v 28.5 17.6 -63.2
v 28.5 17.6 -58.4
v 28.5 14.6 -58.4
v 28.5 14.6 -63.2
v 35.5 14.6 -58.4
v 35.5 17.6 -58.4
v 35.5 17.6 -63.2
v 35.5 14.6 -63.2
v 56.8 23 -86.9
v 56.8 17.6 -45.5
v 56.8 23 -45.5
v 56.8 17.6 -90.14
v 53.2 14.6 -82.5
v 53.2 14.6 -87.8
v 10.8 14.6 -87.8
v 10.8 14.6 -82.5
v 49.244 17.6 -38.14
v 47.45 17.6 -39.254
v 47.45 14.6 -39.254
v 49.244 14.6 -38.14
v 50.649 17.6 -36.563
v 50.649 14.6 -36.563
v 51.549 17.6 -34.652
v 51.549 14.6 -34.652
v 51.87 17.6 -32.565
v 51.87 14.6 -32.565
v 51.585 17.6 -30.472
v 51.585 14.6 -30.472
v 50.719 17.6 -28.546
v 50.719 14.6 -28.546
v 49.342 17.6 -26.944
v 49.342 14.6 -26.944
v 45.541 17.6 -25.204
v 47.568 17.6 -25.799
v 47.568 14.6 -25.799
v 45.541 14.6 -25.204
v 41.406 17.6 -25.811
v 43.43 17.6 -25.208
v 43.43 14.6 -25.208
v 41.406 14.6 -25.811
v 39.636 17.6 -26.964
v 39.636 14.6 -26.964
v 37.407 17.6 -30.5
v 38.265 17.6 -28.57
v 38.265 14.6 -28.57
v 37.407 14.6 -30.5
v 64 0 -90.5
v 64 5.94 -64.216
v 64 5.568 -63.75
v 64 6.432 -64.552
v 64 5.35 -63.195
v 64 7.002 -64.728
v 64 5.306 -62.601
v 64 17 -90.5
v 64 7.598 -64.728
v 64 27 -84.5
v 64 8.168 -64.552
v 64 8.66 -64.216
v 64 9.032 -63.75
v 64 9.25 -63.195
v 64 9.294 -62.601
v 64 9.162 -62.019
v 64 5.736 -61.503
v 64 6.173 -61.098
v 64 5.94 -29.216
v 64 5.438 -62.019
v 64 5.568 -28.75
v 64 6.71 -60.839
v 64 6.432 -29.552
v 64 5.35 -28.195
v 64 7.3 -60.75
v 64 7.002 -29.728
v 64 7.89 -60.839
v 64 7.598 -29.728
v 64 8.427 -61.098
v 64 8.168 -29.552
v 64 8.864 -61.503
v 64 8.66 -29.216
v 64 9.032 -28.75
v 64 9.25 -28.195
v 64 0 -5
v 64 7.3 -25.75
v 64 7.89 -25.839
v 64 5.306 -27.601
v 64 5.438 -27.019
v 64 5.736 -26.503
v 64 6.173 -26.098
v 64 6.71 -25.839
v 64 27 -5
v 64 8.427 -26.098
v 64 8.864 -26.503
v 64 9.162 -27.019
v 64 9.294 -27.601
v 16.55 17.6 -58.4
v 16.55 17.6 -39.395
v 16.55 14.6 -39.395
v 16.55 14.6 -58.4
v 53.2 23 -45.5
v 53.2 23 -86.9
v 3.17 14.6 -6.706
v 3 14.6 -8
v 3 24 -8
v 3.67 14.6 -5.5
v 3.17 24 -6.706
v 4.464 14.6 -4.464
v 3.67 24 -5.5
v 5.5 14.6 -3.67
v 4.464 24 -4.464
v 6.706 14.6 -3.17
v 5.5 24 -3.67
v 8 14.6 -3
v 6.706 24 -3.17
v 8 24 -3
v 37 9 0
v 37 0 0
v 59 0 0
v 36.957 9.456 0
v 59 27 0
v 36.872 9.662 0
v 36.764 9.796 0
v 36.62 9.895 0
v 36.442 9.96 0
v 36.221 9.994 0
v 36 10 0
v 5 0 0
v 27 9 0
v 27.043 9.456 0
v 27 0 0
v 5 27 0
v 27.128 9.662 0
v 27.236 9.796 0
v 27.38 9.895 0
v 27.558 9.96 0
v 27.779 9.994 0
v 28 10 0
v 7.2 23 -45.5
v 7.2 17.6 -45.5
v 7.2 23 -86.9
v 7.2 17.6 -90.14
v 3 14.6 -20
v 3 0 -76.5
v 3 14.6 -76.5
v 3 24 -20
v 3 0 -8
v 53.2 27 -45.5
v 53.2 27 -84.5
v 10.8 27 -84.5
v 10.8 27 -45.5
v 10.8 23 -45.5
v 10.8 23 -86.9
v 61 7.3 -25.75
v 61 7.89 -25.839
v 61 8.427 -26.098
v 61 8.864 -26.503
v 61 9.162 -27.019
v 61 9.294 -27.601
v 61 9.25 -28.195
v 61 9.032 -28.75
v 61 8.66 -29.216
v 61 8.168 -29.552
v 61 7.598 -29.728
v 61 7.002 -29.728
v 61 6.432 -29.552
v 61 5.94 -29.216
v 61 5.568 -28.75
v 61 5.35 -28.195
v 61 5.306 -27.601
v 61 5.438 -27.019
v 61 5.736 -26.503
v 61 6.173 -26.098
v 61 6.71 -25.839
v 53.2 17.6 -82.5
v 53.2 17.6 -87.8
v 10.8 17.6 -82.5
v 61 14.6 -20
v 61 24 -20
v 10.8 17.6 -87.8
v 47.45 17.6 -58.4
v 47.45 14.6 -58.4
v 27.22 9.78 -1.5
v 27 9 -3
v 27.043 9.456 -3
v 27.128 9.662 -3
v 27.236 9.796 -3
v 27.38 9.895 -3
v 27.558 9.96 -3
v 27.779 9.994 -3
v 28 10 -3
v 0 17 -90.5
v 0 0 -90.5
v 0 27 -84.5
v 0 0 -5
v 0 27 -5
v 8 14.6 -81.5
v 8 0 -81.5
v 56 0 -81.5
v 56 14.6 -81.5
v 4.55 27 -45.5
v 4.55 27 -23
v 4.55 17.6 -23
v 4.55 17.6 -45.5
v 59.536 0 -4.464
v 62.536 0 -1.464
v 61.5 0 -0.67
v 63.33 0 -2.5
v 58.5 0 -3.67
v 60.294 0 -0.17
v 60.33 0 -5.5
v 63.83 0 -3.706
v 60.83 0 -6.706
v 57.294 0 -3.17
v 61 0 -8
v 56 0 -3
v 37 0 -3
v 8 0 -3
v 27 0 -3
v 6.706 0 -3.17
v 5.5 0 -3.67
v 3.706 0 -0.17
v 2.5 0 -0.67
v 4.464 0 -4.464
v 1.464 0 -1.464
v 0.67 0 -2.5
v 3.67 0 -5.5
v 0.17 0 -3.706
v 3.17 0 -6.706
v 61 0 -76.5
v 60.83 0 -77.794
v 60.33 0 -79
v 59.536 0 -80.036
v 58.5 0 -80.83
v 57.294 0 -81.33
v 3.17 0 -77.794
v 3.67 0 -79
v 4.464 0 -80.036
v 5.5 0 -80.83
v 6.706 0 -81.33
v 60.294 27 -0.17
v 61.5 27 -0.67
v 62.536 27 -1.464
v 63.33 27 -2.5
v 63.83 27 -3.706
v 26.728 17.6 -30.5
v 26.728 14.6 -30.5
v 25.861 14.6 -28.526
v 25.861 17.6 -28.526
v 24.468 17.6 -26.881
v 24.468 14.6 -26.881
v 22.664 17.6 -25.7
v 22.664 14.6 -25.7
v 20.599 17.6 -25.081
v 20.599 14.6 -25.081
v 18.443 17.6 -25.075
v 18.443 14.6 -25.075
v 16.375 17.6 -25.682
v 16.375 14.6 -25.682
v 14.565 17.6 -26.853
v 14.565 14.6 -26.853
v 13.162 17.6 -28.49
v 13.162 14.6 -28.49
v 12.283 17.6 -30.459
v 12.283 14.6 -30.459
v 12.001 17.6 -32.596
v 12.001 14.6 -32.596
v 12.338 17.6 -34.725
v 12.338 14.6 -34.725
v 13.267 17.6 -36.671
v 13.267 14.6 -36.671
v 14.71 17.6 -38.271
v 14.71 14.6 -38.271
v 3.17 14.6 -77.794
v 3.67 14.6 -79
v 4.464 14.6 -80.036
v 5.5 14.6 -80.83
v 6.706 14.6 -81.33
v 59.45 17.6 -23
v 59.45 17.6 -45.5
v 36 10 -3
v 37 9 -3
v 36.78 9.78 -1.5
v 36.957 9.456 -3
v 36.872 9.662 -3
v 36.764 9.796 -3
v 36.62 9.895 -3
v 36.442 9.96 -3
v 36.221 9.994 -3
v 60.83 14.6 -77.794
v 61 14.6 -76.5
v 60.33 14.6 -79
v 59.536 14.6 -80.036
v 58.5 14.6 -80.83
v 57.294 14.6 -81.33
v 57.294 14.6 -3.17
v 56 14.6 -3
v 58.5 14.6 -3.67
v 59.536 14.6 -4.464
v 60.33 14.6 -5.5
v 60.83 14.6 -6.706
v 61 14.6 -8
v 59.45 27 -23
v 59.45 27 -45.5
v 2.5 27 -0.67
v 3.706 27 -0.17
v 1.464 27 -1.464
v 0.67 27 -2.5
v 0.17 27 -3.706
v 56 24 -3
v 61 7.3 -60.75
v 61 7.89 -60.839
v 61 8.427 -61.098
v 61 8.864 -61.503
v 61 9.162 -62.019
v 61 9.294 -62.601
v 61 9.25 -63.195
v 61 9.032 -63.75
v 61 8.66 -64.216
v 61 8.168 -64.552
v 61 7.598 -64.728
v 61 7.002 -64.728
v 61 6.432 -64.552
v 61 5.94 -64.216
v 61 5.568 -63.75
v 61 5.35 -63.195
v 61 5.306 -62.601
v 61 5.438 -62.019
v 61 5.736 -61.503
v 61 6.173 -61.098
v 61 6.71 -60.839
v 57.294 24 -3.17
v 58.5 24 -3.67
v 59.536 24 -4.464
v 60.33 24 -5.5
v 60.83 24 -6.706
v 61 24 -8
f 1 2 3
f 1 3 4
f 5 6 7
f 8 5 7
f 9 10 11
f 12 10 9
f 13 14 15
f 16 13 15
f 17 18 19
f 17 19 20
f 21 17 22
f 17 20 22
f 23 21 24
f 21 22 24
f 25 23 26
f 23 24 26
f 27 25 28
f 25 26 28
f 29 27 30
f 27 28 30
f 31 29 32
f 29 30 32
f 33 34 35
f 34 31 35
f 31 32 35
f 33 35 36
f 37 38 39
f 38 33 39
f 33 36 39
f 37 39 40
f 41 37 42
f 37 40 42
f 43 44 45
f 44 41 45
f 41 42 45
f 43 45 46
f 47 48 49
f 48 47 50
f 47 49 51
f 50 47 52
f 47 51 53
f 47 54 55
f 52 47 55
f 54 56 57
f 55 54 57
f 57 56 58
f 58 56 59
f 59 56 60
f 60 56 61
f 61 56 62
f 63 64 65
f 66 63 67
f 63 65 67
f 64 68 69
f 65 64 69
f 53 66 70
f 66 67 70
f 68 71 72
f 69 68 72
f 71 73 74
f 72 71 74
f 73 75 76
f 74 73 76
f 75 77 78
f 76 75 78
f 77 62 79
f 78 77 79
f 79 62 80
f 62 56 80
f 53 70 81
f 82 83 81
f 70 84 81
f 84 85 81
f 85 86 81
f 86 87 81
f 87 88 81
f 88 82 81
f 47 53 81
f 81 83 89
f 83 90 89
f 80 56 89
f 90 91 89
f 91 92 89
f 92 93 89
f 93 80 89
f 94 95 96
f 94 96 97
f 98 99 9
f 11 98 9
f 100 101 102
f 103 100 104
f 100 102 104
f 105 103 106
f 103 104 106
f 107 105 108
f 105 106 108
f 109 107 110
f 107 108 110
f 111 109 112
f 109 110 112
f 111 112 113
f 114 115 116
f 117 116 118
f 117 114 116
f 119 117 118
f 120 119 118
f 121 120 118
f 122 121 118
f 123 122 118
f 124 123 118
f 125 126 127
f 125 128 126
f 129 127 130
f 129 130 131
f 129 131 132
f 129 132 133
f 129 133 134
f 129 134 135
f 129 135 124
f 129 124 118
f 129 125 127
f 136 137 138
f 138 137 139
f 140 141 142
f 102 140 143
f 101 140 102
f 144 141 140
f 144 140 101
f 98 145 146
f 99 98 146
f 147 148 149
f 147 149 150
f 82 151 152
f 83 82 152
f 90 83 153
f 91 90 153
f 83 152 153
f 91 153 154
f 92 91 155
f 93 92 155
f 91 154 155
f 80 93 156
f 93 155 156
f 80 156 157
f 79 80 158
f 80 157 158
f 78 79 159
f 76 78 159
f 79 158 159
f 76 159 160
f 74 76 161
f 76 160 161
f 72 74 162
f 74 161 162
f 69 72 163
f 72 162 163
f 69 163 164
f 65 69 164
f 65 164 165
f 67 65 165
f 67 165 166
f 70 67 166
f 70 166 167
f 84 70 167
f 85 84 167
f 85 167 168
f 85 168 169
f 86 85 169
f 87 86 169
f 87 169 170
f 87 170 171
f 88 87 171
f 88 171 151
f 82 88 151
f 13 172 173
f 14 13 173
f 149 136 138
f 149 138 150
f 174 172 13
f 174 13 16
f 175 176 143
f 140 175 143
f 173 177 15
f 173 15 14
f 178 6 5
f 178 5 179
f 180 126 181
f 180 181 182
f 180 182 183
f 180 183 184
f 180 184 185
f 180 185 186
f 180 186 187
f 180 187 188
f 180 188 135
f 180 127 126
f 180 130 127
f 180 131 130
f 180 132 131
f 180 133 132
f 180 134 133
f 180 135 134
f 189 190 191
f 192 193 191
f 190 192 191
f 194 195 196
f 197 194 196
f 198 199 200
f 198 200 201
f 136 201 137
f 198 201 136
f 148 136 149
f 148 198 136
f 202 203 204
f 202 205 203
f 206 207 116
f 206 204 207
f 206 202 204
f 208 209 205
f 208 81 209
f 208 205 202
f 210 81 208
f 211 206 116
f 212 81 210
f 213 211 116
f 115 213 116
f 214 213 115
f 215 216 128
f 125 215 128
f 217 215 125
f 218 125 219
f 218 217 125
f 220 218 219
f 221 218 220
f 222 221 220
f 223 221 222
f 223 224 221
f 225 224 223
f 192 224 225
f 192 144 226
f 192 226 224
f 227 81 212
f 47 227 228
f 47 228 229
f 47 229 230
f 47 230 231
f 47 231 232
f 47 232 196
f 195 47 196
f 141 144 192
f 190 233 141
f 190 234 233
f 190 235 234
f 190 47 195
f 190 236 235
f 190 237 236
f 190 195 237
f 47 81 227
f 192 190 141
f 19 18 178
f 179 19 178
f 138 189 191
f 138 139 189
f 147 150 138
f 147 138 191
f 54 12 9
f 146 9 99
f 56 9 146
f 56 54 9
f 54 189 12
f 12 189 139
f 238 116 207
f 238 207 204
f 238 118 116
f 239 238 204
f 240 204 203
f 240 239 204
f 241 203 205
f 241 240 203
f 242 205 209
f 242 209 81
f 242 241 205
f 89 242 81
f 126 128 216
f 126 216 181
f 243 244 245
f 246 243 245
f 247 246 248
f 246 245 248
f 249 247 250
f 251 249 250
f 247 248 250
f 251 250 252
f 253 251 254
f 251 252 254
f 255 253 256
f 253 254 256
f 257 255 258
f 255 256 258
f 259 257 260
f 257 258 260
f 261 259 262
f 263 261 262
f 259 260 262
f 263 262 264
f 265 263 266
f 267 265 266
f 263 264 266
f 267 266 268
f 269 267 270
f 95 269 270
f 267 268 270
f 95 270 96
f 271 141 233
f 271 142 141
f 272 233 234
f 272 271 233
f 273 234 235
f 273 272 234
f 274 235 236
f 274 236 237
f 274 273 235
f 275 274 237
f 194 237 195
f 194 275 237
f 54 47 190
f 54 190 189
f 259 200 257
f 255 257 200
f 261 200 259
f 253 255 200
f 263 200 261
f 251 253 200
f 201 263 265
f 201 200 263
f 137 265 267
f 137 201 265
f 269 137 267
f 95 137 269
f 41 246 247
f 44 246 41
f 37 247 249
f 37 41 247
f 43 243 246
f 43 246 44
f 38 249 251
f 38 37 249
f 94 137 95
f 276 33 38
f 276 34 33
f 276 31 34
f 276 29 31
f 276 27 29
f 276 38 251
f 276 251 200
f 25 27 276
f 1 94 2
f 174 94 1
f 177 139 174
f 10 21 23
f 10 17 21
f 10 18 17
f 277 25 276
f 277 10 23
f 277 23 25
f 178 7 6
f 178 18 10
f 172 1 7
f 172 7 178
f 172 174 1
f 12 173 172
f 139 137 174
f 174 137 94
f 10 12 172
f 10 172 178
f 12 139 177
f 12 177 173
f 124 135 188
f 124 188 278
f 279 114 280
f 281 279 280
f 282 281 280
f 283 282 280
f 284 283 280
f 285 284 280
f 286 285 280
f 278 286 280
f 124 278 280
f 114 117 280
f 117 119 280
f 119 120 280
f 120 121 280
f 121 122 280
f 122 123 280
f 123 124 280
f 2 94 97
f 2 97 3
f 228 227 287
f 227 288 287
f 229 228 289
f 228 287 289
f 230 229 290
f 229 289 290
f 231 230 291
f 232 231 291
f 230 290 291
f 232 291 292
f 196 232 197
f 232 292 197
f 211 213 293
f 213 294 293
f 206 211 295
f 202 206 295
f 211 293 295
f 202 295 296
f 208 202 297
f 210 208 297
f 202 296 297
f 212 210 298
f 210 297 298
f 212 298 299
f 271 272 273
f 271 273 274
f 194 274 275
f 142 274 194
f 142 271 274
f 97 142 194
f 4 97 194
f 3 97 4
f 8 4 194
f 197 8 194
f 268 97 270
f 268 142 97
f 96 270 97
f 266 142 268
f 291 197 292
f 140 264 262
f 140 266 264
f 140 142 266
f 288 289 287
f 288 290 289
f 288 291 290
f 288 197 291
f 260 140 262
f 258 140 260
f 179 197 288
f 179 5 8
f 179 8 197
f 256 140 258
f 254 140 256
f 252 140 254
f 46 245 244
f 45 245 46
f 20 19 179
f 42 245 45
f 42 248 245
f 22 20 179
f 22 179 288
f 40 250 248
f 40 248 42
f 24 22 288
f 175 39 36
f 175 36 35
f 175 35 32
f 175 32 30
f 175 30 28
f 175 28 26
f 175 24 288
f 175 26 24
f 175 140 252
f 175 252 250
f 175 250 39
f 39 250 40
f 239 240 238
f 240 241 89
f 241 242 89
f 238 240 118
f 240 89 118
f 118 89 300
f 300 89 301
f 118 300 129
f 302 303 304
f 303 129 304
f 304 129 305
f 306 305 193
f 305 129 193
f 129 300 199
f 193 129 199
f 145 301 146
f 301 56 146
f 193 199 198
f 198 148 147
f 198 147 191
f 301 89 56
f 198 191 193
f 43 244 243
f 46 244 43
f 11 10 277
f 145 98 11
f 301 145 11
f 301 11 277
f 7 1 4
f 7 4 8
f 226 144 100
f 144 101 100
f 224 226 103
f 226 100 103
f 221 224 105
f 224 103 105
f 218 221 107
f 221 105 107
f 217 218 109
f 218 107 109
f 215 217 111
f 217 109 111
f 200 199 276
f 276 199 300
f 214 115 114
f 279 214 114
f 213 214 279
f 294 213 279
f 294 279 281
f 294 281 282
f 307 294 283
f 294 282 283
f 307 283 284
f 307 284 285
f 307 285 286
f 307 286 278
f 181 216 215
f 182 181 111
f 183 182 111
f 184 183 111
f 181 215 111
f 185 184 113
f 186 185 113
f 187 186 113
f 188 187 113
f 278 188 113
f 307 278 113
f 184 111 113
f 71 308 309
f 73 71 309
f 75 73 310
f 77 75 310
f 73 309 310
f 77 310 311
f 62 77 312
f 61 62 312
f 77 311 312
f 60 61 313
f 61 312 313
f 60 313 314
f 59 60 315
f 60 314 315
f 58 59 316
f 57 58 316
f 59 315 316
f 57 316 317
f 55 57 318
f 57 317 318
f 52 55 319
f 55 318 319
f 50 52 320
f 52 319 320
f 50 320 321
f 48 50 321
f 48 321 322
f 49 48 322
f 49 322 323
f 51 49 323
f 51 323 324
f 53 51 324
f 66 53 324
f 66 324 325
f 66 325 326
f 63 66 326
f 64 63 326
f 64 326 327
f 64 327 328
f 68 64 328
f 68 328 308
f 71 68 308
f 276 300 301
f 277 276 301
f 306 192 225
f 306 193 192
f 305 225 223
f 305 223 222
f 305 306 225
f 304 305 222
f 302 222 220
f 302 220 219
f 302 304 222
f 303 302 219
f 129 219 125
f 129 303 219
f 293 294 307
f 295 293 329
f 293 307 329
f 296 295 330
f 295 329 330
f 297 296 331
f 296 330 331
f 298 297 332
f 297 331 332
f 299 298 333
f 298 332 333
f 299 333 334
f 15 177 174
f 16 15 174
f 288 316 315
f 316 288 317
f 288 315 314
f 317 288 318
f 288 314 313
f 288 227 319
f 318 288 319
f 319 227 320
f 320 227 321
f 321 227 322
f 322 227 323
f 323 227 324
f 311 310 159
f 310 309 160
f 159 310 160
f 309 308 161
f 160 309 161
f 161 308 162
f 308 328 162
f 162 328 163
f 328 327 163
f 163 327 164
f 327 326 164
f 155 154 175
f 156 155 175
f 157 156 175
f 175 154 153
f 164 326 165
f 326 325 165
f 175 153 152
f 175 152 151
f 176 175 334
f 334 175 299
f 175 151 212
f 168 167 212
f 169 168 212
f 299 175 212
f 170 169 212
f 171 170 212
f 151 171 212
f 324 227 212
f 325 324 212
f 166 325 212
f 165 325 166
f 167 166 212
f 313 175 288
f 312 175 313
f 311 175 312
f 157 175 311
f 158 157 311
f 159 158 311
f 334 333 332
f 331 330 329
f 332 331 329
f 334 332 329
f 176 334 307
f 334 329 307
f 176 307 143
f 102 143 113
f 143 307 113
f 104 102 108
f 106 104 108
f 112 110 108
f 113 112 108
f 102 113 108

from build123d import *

# Parameters (mm, degrees)
SKETCH1_W           = 64
SKETCH1_H           = 84.5
BOSS_EXTRUDE1_DEPTH = 27
FILLET1_R           = 5
SKETCH2_W           = 42.4
SKETCH2_H           = 61.5
CUT_EXTRUDE1_DEPTH  = 9.4
SKETCH3_W           = 3.6
SKETCH3_H           = 5.4
CUT_EXTRUDE2_DEPTH  = 61.5
SKETCH4_W           = 7
SKETCH4_H           = 4.8
CUT_EXTRUDE3_DEPTH  = 61.5
SKETCH5_W           = 58
SKETCH5_H           = 78.5
CUT_EXTRUDE4_DEPTH  = 14.6
FILLET2_R           = 5
CUT_EXTRUDE5_START  = -9.4
CUT_EXTRUDE5_DEPTH  = 9.4
SKETCH7_W           = 10
SKETCH7_H           = 10
CUT_EXTRUDE6_DEPTH  = 10
FILLET3_SIZE        = 1
SKETCH8_W           = 6.25
SKETCH8_H           = 13.5
CUT_EXTRUDE8_DEPTH  = 9.4
CUT_EXTRUDE9_DEPTH  = 10
SKETCH10_W          = 6.25
SKETCH10_H          = 9
CUT_EXTRUDE10_DEPTH = 9.4
SKETCH11_W          = 7
SKETCH11_H          = 1
SKETCH11_W_2        = 29.4
CUT_EXTRUDE11_DEPTH = 9.4
SKETCH12_W          = 29.4
SKETCH12_H          = 7.5
BOSS_EXTRUDE2_DEPTH = 3
SKETCH13_W          = 0.75
SKETCH13_H          = 27.9
CUT_EXTRUDE12_DEPTH = 3
SKETCH15_R          = 7.369867451
SKETCH15_R_2        = 7.5
CUT_EXTRUDE13_DEPTH = 3
BOSS_EXTRUDE3_DEPTH = 64
BOSS_EXTRUDE4_DEPTH = 27
SKETCH18_W          = 49.6
SKETCH18_H          = 7.565133063
CUT_EXTRUDE16_DEPTH = 5.4
SKETCH19_W          = 42.4
SKETCH19_H          = 4
CUT_EXTRUDE17_DEPTH = 5.4
CUT_EXTRUDE18_DEPTH = 3
SKETCH21_R          = 2
CUT_EXTRUDE19_DEPTH = 10


with BuildPart() as part:
    # Sketch1 → Boss-Extrude1 (new body)
    with BuildSketch(Plane(origin=(0, 0, 0), x_dir=(1, 0, 0), z_dir=(0, 1, 0))):
        with Locations((32, 42.25)):
            Rectangle(SKETCH1_W, SKETCH1_H)
    extrude(amount=BOSS_EXTRUDE1_DEPTH)

    # Fillet1
    fillet1_edges = [part.edges().sort_by_distance(p)[0] for p in [
        (0, 13.5, -84.5),
        (64, 13.5, -84.5),
        (64, 13.5, 0),
        (0, 13.5, 0),
    ]]
    fillet(fillet1_edges, radius=FILLET1_R)

    # Sketch2 → Cut-Extrude1 (cut)
    with BuildSketch(Plane(origin=(0, 27, 0), x_dir=(1, 0, 0), z_dir=(0, 1, 0))):
        with Locations((32, 53.75)):
            Rectangle(SKETCH2_W, SKETCH2_H)
    extrude(amount=-CUT_EXTRUDE1_DEPTH, mode=Mode.SUBTRACT)

    # Sketch3 → Cut-Extrude2 (cut)
    with BuildSketch(Plane(origin=(0, 0, -84.5), x_dir=(-1, 0, 0), z_dir=(0, 0, -1))):
        with Locations((-55, 20.3)):
            Rectangle(SKETCH3_W, SKETCH3_H)
        with Locations((-9, 20.3)):
            Rectangle(SKETCH3_W, SKETCH3_H)
    extrude(amount=-CUT_EXTRUDE2_DEPTH, mode=Mode.SUBTRACT)

    # Sketch4 → Cut-Extrude3 (cut)
    with BuildSketch(Plane(origin=(0, 17.6, 0), x_dir=(1, 0, 0), z_dir=(0, 1, 0))):
        Polygon((17.3, 23), (46.7, 23), (46.7, 49.4), (35.5, 49.4), (28.5, 49.4), (17.3, 49.4), align=None)
        with Locations((32, 51.8)):
            Rectangle(SKETCH4_W, SKETCH4_H)
    extrude(amount=-CUT_EXTRUDE3_DEPTH, mode=Mode.SUBTRACT)

    # Sketch5 → Cut-Extrude4 (cut)
    with BuildSketch(Plane.XZ):
        with Locations((32, -42.25)):
            Rectangle(SKETCH5_W, SKETCH5_H)
        Polygon((28.5, -54.2), (28.5, -49.4), (17.3, -49.4), (17.3, -23), (46.7, -23), (46.7, -49.4), (35.5, -49.4), (35.5, -54.2), align=None, mode=Mode.SUBTRACT)
    extrude(amount=-CUT_EXTRUDE4_DEPTH, mode=Mode.SUBTRACT)

    # Fillet2
    fillet2_edges = [part.edges().sort_by_distance(p)[0] for p in [
        (61, 7.3, -3),
        (61, 7.3, -81.5),
        (3, 7.3, -81.5),
        (3, 7.3, -3),
    ]]
    fillet(fillet2_edges, radius=FILLET2_R)

    # Sketch6 → Cut-Extrude5 (cut)
    with BuildSketch(Plane.XZ.offset(-14.6).offset(CUT_EXTRUDE5_START)):
        with BuildLine():
            Line((8, -3), (56, -3))
            ThreePointArc((56, -3), (59.535533906, -4.464466094), (61, -8))
            Line((61, -8), (61, -20))
            Line((61, -20), (56, -20))
            Line((56, -20), (8, -20))
            Line((8, -20), (3, -20))
            Line((3, -20), (3, -8))
            ThreePointArc((3, -8), (4.464466094, -4.464466094), (8, -3))
        make_face()
    extrude(amount=CUT_EXTRUDE5_DEPTH, mode=Mode.SUBTRACT)

    # Sketch7 → Cut-Extrude6 (cut)
    with BuildSketch(Plane.XY):
        with Locations((32, 5)):
            Rectangle(SKETCH7_W, SKETCH7_H)
    extrude(amount=-CUT_EXTRUDE6_DEPTH, mode=Mode.SUBTRACT)

    # Fillet3
    # a fillet whose section is not a circle: 1 mm, written as the material it adds along each edge
    with BuildSketch(Plane(origin=(37, 10, 0), x_dir=(0, -1, 0), z_dir=(0, 0, -1))) as fillet3_piece_1:
        with BuildLine():
            add(Edge.make_bspline([(FILLET3_SIZE, 0), (FILLET3_SIZE * 0.831801948466, 0), (FILLET3_SIZE * 0.663603896932, 0), (FILLET3_SIZE * 0.292893218813, FILLET3_SIZE * 0.0716919198361), (FILLET3_SIZE * 0.0716919198361, FILLET3_SIZE * 0.292893218813), (0, FILLET3_SIZE * 0.663603896932), (0, FILLET3_SIZE * 0.831801948466), (0, FILLET3_SIZE)], knots=[0, 0, 0, 0, 0, 0, 0.5, 0.5, 1, 1, 1, 1, 1, 1], degree=5))
            Line((0, FILLET3_SIZE), (0, 0))
            Line((0, 0), (FILLET3_SIZE, 0))
        make_face()
    extrude(amount=3)
    with BuildSketch(Plane(origin=(27, 10, 0), x_dir=(0, -1, 0), z_dir=(0, 0, -1))) as fillet3_piece_2:
        with BuildLine():
            add(Edge.make_bspline([(FILLET3_SIZE, 0), (FILLET3_SIZE * 0.831801948466, 0), (FILLET3_SIZE * 0.663603896932, 0), (FILLET3_SIZE * 0.292893218813, -FILLET3_SIZE * 0.0716919198361), (FILLET3_SIZE * 0.0716919198361, -FILLET3_SIZE * 0.292893218813), (0, -FILLET3_SIZE * 0.663603896932), (0, -FILLET3_SIZE * 0.831801948466), (0, -FILLET3_SIZE)], knots=[0, 0, 0, 0, 0, 0, 0.5, 0.5, 1, 1, 1, 1, 1, 1], degree=5))
            Line((0, -FILLET3_SIZE), (0, 0))
            Line((0, 0), (FILLET3_SIZE, 0))
        make_face()
    extrude(amount=3)

    # Sketch8 → Cut-Extrude8 (cut)
    with BuildSketch(Plane(origin=(0, 27, 0), x_dir=(1, 0, 0), z_dir=(0, 1, 0))):
        with Locations((7.675, 29.75)):
            Rectangle(SKETCH8_W, SKETCH8_H)
        with Locations((56.325, 29.75)):
            Rectangle(SKETCH8_W, SKETCH8_H)
    extrude(amount=-CUT_EXTRUDE8_DEPTH, mode=Mode.SUBTRACT)

    # Sketch9 → Cut-Extrude9 (cut)
    with BuildSketch(Plane(origin=(0, 17.6, 0), x_dir=(1, 0, 0), z_dir=(0, 1, 0))):
        Polygon((17.3, 49.4), (17.3, 57.4), (28.5, 57.4), (28.5, 62.2), (35.5, 62.2), (35.5, 57.4), (46.7, 57.4), (46.7, 49.4), align=None)
    extrude(amount=-CUT_EXTRUDE9_DEPTH, mode=Mode.SUBTRACT)

    # Sketch10 → Cut-Extrude10 (cut)
    with BuildSketch(Plane(origin=(0, 27, 0), x_dir=(1, 0, 0), z_dir=(0, 1, 0))):
        with Locations((7.675, 41)):
            Rectangle(SKETCH10_W, SKETCH10_H)
        with Locations((56.325, 41)):
            Rectangle(SKETCH10_W, SKETCH10_H)
    extrude(amount=-CUT_EXTRUDE10_DEPTH, mode=Mode.SUBTRACT)

    # Sketch11 → Cut-Extrude11 (cut)
    with BuildSketch(Plane(origin=(0, 17.6, 0), x_dir=(1, 0, 0), z_dir=(0, 1, 0))):
        with Locations((32, 62.7)):
            Rectangle(SKETCH11_W, SKETCH11_H)
        with Locations((32, 57.9)):
            Rectangle(SKETCH11_W_2, SKETCH11_H)
    extrude(amount=-CUT_EXTRUDE11_DEPTH, mode=Mode.SUBTRACT)

    # Sketch12 → Boss-Extrude2 (add)
    with BuildSketch(Plane.XZ.offset(-14.6)):
        with Locations((32, -26.75)):
            Rectangle(SKETCH12_W, SKETCH12_H)
    extrude(amount=-BOSS_EXTRUDE2_DEPTH)

    # Sketch13 → Cut-Extrude12 (cut)
    with BuildSketch(Plane(origin=(0, 17.6, 0), x_dir=(1, 0, 0), z_dir=(0, 1, 0))):
        with Locations((16.925, 44.45)):
            Rectangle(SKETCH13_W, SKETCH13_H)
        with Locations((47.075, 44.45)):
            Rectangle(SKETCH13_W, SKETCH13_H)
    extrude(amount=-CUT_EXTRUDE12_DEPTH, mode=Mode.SUBTRACT)

    # Sketch15 → Cut-Extrude13 (cut)
    with BuildSketch(Plane.XZ.offset(-14.6)):
        with Locations((44.5, -32.5)):
            Circle(SKETCH15_R)
        with Locations((19.5, -32.5)):
            Circle(SKETCH15_R_2)
    extrude(amount=-CUT_EXTRUDE13_DEPTH, mode=Mode.SUBTRACT)

    # Sketch16 → Boss-Extrude3 (add)
    with BuildSketch(Plane(origin=(64, 0, 0), x_dir=(0, 0, -1), z_dir=(1, 0, 0))):
        Polygon((84.5, 27), (84.5, 17), (84.5, 0), (90.5, 0), (90.5, 17), align=None)
    extrude(amount=-BOSS_EXTRUDE3_DEPTH)

    # Sketch17 → Boss-Extrude4 (add)
    with BuildSketch(Plane(origin=(0, 27, 0), x_dir=(1, 0, 0), z_dir=(0, 1, 0))):
        Polygon((64, 84.5), (64, 79.5), (59, 84.5), align=None)
        Polygon((0, 79.5), (5, 84.5), (0, 84.5), align=None)
    extrude(amount=-BOSS_EXTRUDE4_DEPTH)

    # Sketch18 → Cut-Extrude16 (cut)
    with BuildSketch(Plane(origin=(0, 17.6, 0), x_dir=(1, 0, 0), z_dir=(0, 1, 0))):
        with Locations((32, 88.282566532)):
            Rectangle(SKETCH18_W, SKETCH18_H)
    extrude(amount=CUT_EXTRUDE16_DEPTH, mode=Mode.SUBTRACT)

    # Sketch19 → Cut-Extrude17 (cut)
    with BuildSketch(Plane.XY.offset(-84.5)):
        with Locations((32, 25)):
            Rectangle(SKETCH19_W, SKETCH19_H)
    extrude(amount=-CUT_EXTRUDE17_DEPTH, mode=Mode.SUBTRACT)

    # Sketch20 → Cut-Extrude18 (cut)
    with BuildSketch(Plane(origin=(0, 17.6, 0), x_dir=(1, 0, 0), z_dir=(0, 1, 0))):
        Polygon((10.8, 84.5), (10.8, 87.8), (53.2, 87.8), (53.2, 84.5), (53.2, 82.5), (10.8, 82.5), align=None)
    extrude(amount=-CUT_EXTRUDE18_DEPTH, mode=Mode.SUBTRACT)

    # Sketch21 → Cut-Extrude19 (cut)
    with BuildSketch(Plane.ZY.offset(-61)):
        with Locations((-62.75, 7.3)):
            Circle(SKETCH21_R)
        with Locations((-27.75, 7.3)):
            Circle(SKETCH21_R)
    extrude(amount=-CUT_EXTRUDE19_DEPTH, mode=Mode.SUBTRACT)


solid = part.part
